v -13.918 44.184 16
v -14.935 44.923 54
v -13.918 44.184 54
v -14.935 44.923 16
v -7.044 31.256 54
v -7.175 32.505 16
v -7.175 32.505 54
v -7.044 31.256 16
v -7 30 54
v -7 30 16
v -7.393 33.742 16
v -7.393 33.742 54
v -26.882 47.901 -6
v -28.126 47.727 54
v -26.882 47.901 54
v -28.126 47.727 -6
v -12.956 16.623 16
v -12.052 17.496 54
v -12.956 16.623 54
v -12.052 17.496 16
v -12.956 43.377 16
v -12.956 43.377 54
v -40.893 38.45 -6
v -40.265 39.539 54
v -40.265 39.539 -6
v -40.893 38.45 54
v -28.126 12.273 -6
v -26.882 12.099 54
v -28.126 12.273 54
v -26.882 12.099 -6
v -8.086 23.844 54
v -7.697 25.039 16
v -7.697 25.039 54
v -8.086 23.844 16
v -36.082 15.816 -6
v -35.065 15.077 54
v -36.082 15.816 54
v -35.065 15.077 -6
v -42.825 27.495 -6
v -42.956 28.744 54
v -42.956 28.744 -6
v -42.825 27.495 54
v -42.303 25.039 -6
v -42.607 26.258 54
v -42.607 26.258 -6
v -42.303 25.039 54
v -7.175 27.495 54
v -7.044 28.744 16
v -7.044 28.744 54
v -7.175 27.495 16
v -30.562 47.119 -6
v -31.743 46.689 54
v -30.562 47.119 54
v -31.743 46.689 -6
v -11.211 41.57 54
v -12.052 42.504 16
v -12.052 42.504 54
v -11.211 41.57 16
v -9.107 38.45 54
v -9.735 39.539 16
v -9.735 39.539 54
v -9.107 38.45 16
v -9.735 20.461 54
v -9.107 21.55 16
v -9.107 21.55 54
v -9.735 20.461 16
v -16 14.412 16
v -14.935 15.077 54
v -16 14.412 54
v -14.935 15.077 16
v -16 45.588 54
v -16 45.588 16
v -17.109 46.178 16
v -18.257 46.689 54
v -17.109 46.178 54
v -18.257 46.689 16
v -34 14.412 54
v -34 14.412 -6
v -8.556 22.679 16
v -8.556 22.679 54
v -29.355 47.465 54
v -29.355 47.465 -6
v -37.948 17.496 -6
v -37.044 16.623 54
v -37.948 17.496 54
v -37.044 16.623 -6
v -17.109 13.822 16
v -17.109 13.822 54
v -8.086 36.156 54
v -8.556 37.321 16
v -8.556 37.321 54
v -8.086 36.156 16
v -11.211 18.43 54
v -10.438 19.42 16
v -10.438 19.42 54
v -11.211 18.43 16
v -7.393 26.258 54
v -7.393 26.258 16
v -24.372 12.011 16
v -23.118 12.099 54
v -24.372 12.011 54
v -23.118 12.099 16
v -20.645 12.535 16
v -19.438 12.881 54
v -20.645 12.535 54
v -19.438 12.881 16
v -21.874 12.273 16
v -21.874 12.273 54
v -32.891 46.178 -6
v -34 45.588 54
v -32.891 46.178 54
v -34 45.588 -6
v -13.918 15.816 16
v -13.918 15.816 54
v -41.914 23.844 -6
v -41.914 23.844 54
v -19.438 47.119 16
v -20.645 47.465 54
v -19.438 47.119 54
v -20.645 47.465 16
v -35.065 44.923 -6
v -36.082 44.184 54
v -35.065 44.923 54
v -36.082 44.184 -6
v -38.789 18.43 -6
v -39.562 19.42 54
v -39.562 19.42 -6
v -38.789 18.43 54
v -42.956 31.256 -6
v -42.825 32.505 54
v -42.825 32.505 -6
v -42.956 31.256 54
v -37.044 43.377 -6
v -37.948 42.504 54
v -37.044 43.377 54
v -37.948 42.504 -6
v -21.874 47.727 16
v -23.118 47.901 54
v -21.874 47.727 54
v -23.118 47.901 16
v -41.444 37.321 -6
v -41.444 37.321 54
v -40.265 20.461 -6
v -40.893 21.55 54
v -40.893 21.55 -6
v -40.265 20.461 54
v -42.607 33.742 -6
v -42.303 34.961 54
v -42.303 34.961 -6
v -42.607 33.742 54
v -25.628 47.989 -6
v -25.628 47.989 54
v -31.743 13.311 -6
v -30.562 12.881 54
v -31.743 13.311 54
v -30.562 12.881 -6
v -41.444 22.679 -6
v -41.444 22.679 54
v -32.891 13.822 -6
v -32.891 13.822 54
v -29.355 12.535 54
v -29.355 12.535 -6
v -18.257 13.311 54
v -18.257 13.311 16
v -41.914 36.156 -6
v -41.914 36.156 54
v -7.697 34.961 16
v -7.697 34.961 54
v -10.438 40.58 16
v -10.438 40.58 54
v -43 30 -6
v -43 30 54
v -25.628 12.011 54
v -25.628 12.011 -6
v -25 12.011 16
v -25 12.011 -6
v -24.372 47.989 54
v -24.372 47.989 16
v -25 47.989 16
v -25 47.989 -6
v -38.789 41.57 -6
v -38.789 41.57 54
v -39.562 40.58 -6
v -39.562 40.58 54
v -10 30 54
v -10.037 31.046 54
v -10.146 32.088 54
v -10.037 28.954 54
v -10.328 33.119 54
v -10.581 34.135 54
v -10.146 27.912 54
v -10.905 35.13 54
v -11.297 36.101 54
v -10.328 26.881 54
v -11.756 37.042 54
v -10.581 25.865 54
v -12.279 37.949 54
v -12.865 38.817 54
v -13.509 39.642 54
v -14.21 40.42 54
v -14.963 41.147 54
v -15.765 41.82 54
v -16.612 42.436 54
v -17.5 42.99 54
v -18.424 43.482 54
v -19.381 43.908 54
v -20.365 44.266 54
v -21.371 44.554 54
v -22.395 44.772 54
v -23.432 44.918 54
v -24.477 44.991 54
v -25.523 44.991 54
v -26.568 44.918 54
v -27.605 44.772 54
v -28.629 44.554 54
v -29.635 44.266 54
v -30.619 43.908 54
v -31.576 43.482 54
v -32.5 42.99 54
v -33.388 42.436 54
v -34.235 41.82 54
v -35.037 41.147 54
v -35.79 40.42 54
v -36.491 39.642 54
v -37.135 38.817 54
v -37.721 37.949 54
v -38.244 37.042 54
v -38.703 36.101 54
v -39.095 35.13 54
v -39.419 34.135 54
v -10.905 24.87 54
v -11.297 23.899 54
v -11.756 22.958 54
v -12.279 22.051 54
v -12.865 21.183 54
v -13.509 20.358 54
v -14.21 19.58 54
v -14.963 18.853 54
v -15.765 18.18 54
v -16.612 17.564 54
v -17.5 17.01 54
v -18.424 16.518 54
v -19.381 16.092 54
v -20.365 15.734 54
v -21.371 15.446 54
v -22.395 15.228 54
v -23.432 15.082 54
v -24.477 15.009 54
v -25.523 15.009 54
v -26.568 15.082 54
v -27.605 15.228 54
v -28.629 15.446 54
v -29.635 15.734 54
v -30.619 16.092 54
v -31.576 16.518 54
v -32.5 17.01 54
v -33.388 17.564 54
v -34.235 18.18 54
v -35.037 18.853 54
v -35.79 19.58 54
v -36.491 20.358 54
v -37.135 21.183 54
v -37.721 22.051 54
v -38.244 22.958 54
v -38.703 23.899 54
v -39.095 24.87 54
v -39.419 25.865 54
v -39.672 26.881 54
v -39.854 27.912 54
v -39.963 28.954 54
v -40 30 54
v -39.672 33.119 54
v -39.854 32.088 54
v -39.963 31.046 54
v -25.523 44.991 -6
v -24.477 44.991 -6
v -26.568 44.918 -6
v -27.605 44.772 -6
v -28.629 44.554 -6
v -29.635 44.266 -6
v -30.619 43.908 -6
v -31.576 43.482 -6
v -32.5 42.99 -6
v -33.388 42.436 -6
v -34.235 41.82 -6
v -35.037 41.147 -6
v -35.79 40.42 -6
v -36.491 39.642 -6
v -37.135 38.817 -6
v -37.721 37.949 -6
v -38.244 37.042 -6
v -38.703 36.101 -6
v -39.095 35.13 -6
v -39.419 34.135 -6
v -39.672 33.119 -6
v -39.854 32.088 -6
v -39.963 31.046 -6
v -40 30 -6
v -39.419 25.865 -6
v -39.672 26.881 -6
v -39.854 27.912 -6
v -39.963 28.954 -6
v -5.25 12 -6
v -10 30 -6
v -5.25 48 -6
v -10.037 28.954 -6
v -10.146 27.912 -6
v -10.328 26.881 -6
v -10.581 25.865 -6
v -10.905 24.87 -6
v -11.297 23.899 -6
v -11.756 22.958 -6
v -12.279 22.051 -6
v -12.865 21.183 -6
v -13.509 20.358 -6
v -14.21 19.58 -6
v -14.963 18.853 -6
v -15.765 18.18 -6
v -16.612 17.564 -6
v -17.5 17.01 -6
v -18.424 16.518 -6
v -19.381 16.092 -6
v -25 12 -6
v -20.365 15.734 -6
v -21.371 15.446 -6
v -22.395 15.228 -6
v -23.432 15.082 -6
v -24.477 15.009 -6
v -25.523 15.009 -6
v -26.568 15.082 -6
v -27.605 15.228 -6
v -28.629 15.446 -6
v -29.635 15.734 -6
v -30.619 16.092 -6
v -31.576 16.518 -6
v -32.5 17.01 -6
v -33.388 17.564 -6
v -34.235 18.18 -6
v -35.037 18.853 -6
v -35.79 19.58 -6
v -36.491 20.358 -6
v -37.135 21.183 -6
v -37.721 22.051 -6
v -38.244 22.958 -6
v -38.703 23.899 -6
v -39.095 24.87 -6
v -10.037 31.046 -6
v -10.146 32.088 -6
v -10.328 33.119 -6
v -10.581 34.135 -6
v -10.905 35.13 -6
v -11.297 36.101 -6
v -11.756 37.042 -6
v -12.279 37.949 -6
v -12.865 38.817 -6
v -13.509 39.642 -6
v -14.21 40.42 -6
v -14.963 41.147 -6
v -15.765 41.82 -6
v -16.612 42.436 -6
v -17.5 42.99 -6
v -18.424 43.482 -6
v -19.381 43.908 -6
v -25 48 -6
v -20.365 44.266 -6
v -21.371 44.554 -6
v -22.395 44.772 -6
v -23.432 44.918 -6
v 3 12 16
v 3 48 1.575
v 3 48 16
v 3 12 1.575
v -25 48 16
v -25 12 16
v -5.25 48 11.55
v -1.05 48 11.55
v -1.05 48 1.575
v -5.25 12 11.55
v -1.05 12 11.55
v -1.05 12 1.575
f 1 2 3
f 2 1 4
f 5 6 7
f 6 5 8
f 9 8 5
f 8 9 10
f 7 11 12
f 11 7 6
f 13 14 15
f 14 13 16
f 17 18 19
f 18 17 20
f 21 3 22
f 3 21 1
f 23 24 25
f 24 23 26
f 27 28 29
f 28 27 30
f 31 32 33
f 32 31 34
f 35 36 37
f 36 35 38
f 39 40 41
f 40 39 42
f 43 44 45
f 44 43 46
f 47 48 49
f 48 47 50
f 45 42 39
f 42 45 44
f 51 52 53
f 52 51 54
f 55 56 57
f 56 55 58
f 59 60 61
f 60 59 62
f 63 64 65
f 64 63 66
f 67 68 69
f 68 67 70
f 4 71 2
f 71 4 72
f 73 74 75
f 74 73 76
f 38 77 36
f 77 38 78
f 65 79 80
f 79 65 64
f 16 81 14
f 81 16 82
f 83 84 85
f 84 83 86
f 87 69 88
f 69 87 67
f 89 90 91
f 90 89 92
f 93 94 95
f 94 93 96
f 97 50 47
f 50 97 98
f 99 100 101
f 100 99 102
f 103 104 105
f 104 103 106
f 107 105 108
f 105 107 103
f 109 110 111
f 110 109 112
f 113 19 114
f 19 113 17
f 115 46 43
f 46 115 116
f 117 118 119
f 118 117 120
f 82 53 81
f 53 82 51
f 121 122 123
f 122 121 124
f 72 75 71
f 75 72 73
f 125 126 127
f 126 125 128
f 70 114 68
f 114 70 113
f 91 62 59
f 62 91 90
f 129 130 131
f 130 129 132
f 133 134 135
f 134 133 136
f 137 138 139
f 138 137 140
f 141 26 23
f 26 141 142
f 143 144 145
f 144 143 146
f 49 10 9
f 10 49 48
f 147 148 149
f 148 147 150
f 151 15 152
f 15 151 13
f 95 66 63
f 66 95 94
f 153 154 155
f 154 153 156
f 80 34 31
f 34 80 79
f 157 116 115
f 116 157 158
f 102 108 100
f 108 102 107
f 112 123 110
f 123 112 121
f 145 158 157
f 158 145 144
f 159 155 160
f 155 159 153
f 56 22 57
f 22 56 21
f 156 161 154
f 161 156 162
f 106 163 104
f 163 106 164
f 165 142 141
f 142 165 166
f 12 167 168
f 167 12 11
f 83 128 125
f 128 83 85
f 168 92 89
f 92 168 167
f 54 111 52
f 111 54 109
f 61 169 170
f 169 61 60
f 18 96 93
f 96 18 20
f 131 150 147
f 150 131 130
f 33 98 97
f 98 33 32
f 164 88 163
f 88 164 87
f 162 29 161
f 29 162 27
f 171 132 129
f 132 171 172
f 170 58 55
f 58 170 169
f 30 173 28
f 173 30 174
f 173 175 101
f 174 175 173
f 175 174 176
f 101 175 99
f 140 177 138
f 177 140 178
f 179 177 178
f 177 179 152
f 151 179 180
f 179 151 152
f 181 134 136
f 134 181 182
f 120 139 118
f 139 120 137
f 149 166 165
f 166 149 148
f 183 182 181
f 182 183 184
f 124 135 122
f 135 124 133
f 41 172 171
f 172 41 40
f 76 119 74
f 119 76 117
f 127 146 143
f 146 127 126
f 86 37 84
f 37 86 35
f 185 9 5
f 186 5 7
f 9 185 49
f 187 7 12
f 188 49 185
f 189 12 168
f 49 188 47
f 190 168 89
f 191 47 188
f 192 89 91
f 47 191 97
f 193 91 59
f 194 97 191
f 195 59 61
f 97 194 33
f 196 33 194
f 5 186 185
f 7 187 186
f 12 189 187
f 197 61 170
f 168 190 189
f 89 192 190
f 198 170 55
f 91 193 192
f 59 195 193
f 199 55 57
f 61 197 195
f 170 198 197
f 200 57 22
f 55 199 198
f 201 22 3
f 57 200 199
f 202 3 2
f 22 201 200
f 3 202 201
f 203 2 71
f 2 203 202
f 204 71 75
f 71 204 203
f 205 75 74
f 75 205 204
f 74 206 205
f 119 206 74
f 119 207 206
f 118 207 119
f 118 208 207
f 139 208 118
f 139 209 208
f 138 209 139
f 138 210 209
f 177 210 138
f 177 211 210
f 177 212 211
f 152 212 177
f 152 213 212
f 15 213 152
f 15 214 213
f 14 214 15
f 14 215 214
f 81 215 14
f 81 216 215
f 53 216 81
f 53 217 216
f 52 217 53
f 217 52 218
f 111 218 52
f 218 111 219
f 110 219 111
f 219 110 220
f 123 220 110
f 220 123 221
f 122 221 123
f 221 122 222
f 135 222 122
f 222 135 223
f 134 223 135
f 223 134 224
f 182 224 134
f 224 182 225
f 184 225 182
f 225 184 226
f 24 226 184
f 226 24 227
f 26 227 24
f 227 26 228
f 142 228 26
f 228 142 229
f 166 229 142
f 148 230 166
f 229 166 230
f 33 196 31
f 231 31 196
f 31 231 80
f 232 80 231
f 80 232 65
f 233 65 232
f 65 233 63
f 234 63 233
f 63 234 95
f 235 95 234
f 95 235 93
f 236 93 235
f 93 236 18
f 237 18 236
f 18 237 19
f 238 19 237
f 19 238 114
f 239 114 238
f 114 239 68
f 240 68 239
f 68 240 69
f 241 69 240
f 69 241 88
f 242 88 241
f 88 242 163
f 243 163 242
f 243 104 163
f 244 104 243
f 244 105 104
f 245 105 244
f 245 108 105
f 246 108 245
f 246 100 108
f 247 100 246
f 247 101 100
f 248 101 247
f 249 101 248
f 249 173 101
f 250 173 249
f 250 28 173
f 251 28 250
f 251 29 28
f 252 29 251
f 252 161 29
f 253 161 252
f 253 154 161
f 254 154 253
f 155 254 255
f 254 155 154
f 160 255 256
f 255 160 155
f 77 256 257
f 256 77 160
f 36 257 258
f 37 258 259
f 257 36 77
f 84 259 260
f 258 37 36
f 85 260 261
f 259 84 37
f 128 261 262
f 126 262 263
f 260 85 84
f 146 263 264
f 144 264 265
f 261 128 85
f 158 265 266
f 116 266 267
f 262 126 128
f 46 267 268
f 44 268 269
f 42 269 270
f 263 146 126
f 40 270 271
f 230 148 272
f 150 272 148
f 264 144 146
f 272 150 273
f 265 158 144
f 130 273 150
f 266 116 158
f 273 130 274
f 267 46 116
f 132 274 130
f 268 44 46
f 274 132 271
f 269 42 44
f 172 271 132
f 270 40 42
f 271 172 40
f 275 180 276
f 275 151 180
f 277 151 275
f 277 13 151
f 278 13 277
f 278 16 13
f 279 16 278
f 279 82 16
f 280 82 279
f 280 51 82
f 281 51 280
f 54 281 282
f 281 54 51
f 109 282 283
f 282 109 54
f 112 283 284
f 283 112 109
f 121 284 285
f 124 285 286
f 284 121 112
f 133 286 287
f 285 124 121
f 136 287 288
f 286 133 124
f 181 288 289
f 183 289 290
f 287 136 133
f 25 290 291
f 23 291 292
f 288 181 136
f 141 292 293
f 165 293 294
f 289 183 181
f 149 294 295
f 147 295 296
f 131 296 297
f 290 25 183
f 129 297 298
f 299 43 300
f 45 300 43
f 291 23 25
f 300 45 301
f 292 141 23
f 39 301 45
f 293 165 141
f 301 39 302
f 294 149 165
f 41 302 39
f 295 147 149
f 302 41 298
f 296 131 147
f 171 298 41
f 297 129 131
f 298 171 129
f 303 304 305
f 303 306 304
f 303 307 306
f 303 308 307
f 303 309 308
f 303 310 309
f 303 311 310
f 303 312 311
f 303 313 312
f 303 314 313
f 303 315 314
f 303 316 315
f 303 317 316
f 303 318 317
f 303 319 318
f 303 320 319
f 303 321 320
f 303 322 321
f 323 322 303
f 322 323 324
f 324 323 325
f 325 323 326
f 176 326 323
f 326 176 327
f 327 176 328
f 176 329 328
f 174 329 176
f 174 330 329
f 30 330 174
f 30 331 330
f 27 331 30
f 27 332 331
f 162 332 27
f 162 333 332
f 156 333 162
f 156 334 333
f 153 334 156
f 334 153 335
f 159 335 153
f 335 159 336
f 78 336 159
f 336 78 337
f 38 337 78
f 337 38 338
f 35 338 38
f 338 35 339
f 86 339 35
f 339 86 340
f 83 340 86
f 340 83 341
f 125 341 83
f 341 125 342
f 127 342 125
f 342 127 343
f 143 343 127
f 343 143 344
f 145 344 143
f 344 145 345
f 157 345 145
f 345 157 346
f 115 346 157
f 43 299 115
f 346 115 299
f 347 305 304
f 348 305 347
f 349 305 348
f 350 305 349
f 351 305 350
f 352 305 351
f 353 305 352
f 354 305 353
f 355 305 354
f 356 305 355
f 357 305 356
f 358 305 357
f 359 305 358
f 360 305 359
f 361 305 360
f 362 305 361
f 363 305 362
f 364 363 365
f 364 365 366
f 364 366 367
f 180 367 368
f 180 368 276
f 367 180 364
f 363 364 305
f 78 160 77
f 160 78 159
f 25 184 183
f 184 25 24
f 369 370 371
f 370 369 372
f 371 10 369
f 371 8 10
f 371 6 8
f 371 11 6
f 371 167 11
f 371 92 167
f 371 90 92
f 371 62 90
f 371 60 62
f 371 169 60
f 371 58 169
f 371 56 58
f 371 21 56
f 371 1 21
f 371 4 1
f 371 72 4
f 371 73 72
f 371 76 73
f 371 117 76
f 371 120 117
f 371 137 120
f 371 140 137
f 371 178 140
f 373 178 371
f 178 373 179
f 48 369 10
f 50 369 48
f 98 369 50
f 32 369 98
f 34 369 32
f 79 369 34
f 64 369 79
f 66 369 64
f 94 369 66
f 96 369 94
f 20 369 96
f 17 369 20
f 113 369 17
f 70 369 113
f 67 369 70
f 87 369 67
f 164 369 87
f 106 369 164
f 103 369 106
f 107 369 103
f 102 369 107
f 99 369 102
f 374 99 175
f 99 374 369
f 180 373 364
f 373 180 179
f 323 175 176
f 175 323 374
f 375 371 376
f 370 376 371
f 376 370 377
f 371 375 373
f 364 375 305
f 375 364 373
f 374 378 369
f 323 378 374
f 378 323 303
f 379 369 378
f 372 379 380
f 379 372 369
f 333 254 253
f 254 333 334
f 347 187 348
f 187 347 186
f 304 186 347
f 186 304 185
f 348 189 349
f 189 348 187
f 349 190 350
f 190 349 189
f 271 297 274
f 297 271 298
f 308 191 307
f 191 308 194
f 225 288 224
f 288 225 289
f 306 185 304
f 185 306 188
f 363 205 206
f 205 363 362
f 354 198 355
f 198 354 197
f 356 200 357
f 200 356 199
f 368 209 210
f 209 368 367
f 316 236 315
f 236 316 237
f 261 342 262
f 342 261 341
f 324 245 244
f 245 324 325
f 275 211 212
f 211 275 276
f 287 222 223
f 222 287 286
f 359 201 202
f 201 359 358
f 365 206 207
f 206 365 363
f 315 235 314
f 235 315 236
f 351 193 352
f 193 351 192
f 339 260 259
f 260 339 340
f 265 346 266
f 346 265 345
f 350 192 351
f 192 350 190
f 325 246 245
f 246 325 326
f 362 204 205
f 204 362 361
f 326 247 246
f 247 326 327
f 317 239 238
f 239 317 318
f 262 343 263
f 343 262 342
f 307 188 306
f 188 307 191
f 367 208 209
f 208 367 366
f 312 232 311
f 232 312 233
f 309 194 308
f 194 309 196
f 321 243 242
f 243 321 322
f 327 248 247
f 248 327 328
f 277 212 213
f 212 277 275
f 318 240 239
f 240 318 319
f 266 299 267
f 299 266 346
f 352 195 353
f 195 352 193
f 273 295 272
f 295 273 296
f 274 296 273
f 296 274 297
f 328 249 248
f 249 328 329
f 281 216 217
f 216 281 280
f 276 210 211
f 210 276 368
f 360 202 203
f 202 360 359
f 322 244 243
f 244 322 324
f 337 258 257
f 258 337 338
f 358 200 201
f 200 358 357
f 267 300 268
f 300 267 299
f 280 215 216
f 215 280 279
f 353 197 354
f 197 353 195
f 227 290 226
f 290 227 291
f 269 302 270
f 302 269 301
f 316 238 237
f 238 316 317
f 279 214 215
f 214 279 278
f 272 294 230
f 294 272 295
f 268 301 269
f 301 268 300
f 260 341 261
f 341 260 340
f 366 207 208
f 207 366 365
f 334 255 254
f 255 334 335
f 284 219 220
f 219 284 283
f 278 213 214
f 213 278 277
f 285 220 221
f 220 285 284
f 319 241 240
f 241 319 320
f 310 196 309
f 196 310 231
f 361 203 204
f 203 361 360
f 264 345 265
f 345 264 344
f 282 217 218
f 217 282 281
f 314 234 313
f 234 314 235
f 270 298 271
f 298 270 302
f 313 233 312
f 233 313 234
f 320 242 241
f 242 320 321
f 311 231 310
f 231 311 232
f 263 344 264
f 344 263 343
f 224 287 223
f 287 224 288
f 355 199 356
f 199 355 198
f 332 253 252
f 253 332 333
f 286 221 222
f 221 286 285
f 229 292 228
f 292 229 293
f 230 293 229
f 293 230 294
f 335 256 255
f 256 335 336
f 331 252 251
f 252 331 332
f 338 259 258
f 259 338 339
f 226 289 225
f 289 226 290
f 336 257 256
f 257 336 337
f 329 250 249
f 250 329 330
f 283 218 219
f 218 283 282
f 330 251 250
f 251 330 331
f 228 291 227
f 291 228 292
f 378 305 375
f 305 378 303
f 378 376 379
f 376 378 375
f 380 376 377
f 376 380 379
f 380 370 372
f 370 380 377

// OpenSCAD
$fn = $preview ? 45 : 90;

//stand()

module stand() {
    difference() {
        minkowski() {
            cube([146, 78, 10]);
            cylinder(d = 10, h = 1);
        }

        translate([4, 4, 1.5]) minkowski() {
            cube([138, 70, 10]);
            cylinder(d = 10, h = 1);
        }
    }

    translate([0, 0, -6]) minkowski() {
        cube([146, 65, 5]);
        cylinder(d = 10, h = 1);
    }
}

difference() {
    translate([-25, 30, -6]) brushMount();
    scale([1.05, 1, 1.05]) stand();
}

module brushMount() {
    difference() {
        translate([0, 0, 0]) {
            cylinder(d = 36, h = 60);
            translate([0, -18, 0]) cube([28, 36, 22]);
        }
        translate([0, 0, -1]) cylinder(d = 30, h = 70);
    }
}
